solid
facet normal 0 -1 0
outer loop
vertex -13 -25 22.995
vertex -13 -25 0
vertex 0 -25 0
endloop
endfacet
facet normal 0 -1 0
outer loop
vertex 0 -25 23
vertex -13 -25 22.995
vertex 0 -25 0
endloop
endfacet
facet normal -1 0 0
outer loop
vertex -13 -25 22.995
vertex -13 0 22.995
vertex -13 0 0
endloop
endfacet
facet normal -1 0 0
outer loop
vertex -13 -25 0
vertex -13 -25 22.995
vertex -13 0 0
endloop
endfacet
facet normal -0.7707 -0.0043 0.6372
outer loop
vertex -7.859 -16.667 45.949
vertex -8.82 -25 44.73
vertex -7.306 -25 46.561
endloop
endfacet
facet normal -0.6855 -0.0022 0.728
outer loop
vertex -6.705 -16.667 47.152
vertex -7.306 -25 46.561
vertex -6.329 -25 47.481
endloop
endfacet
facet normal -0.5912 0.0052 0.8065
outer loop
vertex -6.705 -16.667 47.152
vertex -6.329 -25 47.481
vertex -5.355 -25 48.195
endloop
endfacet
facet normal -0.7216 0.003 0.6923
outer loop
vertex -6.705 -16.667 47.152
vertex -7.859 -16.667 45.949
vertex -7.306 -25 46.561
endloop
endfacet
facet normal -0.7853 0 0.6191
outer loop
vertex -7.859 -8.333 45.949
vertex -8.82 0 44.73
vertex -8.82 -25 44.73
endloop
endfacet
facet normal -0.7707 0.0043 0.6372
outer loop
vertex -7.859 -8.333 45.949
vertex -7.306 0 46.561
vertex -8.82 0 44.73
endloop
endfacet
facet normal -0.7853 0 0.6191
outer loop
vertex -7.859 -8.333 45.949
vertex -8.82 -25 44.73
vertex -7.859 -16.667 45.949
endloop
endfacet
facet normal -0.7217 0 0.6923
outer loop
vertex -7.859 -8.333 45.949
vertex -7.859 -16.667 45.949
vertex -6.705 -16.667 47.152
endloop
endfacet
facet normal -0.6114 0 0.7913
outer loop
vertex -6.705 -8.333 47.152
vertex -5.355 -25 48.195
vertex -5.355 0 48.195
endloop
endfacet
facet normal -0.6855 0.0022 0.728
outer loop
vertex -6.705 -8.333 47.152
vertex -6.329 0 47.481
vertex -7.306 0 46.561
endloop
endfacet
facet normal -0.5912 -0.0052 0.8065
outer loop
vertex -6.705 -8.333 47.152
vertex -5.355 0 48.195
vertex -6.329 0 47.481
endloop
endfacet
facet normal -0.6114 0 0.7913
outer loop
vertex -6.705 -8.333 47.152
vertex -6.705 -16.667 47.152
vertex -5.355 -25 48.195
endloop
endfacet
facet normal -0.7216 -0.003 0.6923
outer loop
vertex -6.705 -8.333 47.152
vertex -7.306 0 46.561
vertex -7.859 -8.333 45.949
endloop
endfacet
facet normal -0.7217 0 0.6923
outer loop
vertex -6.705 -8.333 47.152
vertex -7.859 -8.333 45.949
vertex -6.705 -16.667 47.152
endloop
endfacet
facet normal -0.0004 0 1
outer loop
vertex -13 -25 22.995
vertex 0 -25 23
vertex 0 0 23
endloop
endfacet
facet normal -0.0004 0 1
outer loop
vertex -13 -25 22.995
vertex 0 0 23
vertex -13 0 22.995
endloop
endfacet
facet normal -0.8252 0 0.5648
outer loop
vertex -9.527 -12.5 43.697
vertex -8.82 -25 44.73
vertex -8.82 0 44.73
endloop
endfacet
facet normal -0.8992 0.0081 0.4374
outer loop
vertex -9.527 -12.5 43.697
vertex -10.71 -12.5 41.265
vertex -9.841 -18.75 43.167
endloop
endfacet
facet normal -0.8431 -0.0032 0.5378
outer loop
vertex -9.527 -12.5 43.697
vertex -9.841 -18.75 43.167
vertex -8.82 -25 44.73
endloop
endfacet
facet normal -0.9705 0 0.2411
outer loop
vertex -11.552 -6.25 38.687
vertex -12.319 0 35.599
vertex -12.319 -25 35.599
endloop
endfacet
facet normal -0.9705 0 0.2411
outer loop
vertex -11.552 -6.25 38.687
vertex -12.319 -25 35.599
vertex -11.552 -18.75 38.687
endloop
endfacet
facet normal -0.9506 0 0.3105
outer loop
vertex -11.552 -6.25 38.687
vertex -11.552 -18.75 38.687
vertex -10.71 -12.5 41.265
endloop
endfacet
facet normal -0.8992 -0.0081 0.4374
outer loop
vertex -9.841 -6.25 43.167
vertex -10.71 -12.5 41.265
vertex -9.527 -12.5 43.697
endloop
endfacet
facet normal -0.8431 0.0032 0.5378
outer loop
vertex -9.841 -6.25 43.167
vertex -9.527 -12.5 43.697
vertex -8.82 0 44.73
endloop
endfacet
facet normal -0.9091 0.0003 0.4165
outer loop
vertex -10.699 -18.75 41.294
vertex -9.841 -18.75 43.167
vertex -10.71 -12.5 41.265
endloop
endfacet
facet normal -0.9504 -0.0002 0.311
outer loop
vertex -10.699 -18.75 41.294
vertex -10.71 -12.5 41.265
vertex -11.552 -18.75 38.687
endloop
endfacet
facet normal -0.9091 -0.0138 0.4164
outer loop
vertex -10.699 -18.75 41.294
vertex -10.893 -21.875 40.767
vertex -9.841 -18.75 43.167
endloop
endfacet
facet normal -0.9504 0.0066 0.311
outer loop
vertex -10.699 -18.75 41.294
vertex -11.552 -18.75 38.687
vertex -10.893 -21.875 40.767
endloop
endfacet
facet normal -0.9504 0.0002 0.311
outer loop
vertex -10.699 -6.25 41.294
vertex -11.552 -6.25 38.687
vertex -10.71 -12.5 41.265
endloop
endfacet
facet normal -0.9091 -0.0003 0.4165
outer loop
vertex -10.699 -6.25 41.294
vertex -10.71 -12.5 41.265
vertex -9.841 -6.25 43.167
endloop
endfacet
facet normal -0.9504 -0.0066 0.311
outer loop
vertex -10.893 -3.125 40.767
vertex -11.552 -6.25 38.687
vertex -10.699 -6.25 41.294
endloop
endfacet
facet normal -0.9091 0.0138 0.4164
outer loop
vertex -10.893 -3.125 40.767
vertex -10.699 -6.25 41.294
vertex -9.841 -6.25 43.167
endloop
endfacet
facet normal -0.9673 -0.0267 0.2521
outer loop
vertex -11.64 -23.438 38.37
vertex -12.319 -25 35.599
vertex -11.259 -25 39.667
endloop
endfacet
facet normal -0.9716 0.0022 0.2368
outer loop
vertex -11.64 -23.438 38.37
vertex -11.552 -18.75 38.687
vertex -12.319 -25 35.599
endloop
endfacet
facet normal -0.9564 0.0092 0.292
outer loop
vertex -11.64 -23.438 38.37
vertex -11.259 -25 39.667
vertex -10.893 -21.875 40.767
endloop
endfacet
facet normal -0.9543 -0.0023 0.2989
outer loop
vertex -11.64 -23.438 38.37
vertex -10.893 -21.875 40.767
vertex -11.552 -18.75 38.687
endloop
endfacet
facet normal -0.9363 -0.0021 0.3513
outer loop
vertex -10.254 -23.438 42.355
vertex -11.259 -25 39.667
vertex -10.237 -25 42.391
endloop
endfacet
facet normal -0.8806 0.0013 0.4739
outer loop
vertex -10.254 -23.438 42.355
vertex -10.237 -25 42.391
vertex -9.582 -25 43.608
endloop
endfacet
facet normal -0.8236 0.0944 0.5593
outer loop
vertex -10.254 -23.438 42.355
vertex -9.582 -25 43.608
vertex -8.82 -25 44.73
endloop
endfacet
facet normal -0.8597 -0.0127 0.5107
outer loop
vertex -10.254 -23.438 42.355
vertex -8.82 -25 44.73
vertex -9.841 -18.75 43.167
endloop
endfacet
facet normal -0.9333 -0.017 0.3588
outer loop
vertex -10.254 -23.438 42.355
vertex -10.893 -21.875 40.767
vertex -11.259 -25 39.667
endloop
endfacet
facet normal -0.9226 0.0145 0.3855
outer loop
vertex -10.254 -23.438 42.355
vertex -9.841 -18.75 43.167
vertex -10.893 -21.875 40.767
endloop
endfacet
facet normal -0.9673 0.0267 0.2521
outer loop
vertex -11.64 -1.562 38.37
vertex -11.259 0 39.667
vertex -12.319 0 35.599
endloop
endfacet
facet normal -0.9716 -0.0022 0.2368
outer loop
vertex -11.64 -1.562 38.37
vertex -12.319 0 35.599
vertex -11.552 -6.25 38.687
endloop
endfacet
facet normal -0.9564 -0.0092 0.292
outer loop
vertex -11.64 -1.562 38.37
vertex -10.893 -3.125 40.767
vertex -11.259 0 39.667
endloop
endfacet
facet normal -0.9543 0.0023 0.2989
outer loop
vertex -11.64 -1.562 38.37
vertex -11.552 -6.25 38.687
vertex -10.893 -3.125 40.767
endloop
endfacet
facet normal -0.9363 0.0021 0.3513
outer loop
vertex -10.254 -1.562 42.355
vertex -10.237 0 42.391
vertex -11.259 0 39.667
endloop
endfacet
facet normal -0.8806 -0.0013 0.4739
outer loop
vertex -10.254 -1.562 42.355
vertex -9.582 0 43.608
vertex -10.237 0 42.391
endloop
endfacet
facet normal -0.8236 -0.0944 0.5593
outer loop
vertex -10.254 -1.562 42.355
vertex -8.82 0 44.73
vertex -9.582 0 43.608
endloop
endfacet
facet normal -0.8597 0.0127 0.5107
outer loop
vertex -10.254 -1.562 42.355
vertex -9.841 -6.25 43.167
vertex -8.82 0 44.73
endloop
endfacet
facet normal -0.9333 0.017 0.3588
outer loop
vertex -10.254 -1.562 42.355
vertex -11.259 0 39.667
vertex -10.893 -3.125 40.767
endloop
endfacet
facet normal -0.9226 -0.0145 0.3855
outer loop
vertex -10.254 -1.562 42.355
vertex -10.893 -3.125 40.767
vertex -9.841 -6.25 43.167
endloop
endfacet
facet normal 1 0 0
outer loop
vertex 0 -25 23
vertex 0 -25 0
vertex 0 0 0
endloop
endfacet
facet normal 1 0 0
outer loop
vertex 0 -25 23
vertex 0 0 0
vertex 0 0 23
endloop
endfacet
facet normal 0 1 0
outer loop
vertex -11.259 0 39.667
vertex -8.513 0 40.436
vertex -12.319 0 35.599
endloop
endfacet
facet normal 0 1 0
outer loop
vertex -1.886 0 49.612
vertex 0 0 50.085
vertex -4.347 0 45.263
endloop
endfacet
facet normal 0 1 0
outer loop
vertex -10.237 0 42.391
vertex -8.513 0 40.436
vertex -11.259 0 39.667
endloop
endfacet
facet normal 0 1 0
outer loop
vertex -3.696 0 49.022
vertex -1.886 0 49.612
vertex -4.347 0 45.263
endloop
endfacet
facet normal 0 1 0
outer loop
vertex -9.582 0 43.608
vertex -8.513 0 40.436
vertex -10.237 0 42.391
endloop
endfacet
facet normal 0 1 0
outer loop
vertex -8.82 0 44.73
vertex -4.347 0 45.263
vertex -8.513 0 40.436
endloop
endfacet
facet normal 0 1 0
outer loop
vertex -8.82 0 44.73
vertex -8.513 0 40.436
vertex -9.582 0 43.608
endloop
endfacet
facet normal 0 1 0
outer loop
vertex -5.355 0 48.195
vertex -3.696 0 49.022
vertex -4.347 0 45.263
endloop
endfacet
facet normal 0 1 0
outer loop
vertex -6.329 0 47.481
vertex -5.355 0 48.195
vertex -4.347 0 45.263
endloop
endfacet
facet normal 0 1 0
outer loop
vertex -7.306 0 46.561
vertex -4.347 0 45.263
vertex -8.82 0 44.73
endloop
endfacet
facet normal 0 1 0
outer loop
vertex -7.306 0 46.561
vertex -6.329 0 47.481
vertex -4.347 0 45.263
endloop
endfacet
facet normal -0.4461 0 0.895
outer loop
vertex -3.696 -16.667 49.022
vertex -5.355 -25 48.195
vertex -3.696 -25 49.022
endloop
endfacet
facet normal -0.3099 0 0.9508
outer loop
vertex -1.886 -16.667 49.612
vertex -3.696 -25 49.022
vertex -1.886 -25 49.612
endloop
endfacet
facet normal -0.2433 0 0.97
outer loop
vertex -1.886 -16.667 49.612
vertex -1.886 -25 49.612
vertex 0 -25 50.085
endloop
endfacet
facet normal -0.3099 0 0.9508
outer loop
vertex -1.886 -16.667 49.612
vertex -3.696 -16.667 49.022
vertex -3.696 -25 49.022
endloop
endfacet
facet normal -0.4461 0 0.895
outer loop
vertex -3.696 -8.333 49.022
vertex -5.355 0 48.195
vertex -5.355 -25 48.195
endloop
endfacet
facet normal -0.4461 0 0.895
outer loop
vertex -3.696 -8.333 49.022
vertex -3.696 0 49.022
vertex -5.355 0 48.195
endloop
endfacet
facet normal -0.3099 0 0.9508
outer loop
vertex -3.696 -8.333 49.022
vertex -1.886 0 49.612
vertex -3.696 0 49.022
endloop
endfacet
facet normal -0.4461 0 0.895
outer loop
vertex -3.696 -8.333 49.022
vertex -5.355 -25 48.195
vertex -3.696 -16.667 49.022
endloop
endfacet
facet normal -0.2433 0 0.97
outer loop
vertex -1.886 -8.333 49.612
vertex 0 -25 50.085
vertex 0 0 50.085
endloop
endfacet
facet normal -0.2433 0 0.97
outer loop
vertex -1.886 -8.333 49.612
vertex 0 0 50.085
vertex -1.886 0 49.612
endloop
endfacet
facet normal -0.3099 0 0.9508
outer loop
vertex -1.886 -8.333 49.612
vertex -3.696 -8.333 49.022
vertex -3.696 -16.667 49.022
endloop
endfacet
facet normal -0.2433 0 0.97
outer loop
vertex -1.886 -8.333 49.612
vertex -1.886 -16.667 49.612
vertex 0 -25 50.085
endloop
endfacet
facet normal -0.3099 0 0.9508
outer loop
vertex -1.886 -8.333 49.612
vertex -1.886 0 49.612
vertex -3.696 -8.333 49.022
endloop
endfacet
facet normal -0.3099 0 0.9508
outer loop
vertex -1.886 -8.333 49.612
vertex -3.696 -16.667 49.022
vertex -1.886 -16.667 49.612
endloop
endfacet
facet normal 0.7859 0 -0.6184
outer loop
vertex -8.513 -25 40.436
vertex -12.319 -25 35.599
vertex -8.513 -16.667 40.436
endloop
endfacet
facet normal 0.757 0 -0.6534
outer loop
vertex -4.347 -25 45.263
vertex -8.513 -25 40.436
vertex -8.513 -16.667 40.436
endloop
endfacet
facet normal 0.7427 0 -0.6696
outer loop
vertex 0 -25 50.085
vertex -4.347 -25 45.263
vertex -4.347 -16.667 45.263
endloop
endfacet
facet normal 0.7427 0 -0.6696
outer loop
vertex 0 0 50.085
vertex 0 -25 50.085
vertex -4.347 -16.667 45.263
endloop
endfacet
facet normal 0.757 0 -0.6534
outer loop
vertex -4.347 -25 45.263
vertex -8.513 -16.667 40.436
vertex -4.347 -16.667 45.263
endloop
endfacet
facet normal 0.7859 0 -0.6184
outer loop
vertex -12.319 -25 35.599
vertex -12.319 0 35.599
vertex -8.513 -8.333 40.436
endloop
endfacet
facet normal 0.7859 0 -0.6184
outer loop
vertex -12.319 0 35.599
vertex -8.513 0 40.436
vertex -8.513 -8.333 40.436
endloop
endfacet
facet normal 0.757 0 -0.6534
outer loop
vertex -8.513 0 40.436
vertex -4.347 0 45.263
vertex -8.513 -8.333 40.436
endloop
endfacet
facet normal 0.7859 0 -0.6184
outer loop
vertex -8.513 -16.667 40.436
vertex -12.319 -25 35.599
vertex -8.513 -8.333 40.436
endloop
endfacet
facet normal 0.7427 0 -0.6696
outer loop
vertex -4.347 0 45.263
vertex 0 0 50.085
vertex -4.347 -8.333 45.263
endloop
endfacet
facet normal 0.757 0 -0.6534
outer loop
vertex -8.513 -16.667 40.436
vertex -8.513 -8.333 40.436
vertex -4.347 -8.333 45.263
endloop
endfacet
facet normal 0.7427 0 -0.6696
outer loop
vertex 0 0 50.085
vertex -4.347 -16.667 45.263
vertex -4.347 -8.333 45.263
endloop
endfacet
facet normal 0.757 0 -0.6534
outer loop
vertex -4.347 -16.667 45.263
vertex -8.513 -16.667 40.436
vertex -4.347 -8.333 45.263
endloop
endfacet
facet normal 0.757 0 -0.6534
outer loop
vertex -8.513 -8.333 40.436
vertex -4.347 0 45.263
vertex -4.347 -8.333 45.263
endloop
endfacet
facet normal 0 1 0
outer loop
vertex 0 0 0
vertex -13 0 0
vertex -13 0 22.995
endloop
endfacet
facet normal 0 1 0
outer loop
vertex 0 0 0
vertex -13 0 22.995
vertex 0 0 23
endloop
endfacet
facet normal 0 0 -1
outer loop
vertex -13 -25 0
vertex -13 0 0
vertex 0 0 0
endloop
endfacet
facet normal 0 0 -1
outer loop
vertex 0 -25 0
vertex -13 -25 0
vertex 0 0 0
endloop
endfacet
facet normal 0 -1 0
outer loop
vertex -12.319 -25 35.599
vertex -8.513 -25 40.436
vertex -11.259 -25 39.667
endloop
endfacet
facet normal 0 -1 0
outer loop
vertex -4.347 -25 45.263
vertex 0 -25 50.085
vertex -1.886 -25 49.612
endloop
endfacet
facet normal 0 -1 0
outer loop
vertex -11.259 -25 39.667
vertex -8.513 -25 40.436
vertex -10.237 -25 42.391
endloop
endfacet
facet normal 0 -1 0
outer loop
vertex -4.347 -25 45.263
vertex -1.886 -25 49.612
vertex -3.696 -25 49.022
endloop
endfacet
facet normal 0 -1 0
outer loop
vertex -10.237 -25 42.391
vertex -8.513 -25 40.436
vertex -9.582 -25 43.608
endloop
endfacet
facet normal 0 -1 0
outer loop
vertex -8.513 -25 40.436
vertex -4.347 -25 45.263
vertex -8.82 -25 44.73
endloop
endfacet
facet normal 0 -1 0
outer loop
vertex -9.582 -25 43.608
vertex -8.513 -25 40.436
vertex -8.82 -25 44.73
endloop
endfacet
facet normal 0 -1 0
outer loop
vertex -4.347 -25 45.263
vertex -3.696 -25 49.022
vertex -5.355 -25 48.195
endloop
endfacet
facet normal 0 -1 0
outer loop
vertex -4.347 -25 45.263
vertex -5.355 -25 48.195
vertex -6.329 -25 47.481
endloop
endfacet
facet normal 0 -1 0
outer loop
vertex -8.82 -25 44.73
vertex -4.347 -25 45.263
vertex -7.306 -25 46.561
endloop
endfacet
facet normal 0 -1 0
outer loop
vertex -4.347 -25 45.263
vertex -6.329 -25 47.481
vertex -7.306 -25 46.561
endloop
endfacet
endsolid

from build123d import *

# Parameters (mm, degrees)
F1_DEPTH = 25


with BuildPart() as f1:
    # F0 (on Front) → F1 (new body)
    with BuildSketch(Plane.XZ):
        Polygon((-13, 0), (0, 0), (0, 23), (-13, 22.9950007051), align=None)
    extrude(amount=F1_DEPTH)


with BuildPart() as f1b:
    # F0 (on Front) → F1, piece 2 (new body)
    with BuildSketch(Plane.XZ):
        with BuildLine():
            add(Edge.make_bspline(
                [(-12.3191955169, 35.5989873608), (-11.8586507551, 37.7477160795), (-10.6638718821, 41.8963955823), (-9.5950873234, 43.6730051345), (-8.8199973106, 44.7299964726)],
                knots=[0.3274203544, 0.3274203544, 0.3274203544, 0.3274203544, 0.4802626372, 0.6371062783, 0.6371062783, 0.6371062783, 0.6371062783], degree=3))
            add(Edge.make_bspline(
                [(-12.3191955169, 35.5989873608), (-8.7536784852, 40.4430165158), (-4.3768392426, 45.2640086048), (0, 50.0850006938)],
                knots=[0.7069793713, 0.7069793713, 0.7069793713, 0.7069793713, 1, 1, 1, 1], degree=3))
            add(Edge.make_bspline(
                [(-5.3550023586, 48.1950007379), (-3.7968009273, 49.1792932798), (-1.8984004636, 49.6321469868), (0, 50.0850006938)],
                knots=[0.8118678436, 0.8118678436, 0.8118678436, 0.8118678436, 1, 1, 1, 1], degree=3))
            add(Edge.make_bspline(
                [(-8.8199973106, 44.7299964726), (-7.6649989933, 45.8849978944), (-6.5100006759, 47.0399993161), (-5.3550023586, 48.1950007379)],
                knots=[0, 0, 0, 0, 4.9002494402, 4.9002494402, 4.9002494402, 4.9002494402], degree=3))
        make_face()
        with BuildLine():
            add(Edge.make_bspline(
                [(-8.8199973106, 44.7299964726), (-7.9563604885, 45.907739219), (-6.8024620925, 47.2806620701), (-5.3550023586, 48.1950007379)],
                knots=[0.6371062783, 0.6371062783, 0.6371062783, 0.6371062783, 0.8118678436, 0.8118678436, 0.8118678436, 0.8118678436], degree=3))
            add(Edge.make_bspline(
                [(-8.8199973106, 44.7299964726), (-7.6649989933, 45.8849978944), (-6.5100006759, 47.0399993161), (-5.3550023586, 48.1950007379)],
                knots=[0, 0, 0, 0, 4.9002494402, 4.9002494402, 4.9002494402, 4.9002494402], degree=3))
        make_face()
    extrude(amount=F1_DEPTH)


solid = Compound([f1.part, f1b.part])
